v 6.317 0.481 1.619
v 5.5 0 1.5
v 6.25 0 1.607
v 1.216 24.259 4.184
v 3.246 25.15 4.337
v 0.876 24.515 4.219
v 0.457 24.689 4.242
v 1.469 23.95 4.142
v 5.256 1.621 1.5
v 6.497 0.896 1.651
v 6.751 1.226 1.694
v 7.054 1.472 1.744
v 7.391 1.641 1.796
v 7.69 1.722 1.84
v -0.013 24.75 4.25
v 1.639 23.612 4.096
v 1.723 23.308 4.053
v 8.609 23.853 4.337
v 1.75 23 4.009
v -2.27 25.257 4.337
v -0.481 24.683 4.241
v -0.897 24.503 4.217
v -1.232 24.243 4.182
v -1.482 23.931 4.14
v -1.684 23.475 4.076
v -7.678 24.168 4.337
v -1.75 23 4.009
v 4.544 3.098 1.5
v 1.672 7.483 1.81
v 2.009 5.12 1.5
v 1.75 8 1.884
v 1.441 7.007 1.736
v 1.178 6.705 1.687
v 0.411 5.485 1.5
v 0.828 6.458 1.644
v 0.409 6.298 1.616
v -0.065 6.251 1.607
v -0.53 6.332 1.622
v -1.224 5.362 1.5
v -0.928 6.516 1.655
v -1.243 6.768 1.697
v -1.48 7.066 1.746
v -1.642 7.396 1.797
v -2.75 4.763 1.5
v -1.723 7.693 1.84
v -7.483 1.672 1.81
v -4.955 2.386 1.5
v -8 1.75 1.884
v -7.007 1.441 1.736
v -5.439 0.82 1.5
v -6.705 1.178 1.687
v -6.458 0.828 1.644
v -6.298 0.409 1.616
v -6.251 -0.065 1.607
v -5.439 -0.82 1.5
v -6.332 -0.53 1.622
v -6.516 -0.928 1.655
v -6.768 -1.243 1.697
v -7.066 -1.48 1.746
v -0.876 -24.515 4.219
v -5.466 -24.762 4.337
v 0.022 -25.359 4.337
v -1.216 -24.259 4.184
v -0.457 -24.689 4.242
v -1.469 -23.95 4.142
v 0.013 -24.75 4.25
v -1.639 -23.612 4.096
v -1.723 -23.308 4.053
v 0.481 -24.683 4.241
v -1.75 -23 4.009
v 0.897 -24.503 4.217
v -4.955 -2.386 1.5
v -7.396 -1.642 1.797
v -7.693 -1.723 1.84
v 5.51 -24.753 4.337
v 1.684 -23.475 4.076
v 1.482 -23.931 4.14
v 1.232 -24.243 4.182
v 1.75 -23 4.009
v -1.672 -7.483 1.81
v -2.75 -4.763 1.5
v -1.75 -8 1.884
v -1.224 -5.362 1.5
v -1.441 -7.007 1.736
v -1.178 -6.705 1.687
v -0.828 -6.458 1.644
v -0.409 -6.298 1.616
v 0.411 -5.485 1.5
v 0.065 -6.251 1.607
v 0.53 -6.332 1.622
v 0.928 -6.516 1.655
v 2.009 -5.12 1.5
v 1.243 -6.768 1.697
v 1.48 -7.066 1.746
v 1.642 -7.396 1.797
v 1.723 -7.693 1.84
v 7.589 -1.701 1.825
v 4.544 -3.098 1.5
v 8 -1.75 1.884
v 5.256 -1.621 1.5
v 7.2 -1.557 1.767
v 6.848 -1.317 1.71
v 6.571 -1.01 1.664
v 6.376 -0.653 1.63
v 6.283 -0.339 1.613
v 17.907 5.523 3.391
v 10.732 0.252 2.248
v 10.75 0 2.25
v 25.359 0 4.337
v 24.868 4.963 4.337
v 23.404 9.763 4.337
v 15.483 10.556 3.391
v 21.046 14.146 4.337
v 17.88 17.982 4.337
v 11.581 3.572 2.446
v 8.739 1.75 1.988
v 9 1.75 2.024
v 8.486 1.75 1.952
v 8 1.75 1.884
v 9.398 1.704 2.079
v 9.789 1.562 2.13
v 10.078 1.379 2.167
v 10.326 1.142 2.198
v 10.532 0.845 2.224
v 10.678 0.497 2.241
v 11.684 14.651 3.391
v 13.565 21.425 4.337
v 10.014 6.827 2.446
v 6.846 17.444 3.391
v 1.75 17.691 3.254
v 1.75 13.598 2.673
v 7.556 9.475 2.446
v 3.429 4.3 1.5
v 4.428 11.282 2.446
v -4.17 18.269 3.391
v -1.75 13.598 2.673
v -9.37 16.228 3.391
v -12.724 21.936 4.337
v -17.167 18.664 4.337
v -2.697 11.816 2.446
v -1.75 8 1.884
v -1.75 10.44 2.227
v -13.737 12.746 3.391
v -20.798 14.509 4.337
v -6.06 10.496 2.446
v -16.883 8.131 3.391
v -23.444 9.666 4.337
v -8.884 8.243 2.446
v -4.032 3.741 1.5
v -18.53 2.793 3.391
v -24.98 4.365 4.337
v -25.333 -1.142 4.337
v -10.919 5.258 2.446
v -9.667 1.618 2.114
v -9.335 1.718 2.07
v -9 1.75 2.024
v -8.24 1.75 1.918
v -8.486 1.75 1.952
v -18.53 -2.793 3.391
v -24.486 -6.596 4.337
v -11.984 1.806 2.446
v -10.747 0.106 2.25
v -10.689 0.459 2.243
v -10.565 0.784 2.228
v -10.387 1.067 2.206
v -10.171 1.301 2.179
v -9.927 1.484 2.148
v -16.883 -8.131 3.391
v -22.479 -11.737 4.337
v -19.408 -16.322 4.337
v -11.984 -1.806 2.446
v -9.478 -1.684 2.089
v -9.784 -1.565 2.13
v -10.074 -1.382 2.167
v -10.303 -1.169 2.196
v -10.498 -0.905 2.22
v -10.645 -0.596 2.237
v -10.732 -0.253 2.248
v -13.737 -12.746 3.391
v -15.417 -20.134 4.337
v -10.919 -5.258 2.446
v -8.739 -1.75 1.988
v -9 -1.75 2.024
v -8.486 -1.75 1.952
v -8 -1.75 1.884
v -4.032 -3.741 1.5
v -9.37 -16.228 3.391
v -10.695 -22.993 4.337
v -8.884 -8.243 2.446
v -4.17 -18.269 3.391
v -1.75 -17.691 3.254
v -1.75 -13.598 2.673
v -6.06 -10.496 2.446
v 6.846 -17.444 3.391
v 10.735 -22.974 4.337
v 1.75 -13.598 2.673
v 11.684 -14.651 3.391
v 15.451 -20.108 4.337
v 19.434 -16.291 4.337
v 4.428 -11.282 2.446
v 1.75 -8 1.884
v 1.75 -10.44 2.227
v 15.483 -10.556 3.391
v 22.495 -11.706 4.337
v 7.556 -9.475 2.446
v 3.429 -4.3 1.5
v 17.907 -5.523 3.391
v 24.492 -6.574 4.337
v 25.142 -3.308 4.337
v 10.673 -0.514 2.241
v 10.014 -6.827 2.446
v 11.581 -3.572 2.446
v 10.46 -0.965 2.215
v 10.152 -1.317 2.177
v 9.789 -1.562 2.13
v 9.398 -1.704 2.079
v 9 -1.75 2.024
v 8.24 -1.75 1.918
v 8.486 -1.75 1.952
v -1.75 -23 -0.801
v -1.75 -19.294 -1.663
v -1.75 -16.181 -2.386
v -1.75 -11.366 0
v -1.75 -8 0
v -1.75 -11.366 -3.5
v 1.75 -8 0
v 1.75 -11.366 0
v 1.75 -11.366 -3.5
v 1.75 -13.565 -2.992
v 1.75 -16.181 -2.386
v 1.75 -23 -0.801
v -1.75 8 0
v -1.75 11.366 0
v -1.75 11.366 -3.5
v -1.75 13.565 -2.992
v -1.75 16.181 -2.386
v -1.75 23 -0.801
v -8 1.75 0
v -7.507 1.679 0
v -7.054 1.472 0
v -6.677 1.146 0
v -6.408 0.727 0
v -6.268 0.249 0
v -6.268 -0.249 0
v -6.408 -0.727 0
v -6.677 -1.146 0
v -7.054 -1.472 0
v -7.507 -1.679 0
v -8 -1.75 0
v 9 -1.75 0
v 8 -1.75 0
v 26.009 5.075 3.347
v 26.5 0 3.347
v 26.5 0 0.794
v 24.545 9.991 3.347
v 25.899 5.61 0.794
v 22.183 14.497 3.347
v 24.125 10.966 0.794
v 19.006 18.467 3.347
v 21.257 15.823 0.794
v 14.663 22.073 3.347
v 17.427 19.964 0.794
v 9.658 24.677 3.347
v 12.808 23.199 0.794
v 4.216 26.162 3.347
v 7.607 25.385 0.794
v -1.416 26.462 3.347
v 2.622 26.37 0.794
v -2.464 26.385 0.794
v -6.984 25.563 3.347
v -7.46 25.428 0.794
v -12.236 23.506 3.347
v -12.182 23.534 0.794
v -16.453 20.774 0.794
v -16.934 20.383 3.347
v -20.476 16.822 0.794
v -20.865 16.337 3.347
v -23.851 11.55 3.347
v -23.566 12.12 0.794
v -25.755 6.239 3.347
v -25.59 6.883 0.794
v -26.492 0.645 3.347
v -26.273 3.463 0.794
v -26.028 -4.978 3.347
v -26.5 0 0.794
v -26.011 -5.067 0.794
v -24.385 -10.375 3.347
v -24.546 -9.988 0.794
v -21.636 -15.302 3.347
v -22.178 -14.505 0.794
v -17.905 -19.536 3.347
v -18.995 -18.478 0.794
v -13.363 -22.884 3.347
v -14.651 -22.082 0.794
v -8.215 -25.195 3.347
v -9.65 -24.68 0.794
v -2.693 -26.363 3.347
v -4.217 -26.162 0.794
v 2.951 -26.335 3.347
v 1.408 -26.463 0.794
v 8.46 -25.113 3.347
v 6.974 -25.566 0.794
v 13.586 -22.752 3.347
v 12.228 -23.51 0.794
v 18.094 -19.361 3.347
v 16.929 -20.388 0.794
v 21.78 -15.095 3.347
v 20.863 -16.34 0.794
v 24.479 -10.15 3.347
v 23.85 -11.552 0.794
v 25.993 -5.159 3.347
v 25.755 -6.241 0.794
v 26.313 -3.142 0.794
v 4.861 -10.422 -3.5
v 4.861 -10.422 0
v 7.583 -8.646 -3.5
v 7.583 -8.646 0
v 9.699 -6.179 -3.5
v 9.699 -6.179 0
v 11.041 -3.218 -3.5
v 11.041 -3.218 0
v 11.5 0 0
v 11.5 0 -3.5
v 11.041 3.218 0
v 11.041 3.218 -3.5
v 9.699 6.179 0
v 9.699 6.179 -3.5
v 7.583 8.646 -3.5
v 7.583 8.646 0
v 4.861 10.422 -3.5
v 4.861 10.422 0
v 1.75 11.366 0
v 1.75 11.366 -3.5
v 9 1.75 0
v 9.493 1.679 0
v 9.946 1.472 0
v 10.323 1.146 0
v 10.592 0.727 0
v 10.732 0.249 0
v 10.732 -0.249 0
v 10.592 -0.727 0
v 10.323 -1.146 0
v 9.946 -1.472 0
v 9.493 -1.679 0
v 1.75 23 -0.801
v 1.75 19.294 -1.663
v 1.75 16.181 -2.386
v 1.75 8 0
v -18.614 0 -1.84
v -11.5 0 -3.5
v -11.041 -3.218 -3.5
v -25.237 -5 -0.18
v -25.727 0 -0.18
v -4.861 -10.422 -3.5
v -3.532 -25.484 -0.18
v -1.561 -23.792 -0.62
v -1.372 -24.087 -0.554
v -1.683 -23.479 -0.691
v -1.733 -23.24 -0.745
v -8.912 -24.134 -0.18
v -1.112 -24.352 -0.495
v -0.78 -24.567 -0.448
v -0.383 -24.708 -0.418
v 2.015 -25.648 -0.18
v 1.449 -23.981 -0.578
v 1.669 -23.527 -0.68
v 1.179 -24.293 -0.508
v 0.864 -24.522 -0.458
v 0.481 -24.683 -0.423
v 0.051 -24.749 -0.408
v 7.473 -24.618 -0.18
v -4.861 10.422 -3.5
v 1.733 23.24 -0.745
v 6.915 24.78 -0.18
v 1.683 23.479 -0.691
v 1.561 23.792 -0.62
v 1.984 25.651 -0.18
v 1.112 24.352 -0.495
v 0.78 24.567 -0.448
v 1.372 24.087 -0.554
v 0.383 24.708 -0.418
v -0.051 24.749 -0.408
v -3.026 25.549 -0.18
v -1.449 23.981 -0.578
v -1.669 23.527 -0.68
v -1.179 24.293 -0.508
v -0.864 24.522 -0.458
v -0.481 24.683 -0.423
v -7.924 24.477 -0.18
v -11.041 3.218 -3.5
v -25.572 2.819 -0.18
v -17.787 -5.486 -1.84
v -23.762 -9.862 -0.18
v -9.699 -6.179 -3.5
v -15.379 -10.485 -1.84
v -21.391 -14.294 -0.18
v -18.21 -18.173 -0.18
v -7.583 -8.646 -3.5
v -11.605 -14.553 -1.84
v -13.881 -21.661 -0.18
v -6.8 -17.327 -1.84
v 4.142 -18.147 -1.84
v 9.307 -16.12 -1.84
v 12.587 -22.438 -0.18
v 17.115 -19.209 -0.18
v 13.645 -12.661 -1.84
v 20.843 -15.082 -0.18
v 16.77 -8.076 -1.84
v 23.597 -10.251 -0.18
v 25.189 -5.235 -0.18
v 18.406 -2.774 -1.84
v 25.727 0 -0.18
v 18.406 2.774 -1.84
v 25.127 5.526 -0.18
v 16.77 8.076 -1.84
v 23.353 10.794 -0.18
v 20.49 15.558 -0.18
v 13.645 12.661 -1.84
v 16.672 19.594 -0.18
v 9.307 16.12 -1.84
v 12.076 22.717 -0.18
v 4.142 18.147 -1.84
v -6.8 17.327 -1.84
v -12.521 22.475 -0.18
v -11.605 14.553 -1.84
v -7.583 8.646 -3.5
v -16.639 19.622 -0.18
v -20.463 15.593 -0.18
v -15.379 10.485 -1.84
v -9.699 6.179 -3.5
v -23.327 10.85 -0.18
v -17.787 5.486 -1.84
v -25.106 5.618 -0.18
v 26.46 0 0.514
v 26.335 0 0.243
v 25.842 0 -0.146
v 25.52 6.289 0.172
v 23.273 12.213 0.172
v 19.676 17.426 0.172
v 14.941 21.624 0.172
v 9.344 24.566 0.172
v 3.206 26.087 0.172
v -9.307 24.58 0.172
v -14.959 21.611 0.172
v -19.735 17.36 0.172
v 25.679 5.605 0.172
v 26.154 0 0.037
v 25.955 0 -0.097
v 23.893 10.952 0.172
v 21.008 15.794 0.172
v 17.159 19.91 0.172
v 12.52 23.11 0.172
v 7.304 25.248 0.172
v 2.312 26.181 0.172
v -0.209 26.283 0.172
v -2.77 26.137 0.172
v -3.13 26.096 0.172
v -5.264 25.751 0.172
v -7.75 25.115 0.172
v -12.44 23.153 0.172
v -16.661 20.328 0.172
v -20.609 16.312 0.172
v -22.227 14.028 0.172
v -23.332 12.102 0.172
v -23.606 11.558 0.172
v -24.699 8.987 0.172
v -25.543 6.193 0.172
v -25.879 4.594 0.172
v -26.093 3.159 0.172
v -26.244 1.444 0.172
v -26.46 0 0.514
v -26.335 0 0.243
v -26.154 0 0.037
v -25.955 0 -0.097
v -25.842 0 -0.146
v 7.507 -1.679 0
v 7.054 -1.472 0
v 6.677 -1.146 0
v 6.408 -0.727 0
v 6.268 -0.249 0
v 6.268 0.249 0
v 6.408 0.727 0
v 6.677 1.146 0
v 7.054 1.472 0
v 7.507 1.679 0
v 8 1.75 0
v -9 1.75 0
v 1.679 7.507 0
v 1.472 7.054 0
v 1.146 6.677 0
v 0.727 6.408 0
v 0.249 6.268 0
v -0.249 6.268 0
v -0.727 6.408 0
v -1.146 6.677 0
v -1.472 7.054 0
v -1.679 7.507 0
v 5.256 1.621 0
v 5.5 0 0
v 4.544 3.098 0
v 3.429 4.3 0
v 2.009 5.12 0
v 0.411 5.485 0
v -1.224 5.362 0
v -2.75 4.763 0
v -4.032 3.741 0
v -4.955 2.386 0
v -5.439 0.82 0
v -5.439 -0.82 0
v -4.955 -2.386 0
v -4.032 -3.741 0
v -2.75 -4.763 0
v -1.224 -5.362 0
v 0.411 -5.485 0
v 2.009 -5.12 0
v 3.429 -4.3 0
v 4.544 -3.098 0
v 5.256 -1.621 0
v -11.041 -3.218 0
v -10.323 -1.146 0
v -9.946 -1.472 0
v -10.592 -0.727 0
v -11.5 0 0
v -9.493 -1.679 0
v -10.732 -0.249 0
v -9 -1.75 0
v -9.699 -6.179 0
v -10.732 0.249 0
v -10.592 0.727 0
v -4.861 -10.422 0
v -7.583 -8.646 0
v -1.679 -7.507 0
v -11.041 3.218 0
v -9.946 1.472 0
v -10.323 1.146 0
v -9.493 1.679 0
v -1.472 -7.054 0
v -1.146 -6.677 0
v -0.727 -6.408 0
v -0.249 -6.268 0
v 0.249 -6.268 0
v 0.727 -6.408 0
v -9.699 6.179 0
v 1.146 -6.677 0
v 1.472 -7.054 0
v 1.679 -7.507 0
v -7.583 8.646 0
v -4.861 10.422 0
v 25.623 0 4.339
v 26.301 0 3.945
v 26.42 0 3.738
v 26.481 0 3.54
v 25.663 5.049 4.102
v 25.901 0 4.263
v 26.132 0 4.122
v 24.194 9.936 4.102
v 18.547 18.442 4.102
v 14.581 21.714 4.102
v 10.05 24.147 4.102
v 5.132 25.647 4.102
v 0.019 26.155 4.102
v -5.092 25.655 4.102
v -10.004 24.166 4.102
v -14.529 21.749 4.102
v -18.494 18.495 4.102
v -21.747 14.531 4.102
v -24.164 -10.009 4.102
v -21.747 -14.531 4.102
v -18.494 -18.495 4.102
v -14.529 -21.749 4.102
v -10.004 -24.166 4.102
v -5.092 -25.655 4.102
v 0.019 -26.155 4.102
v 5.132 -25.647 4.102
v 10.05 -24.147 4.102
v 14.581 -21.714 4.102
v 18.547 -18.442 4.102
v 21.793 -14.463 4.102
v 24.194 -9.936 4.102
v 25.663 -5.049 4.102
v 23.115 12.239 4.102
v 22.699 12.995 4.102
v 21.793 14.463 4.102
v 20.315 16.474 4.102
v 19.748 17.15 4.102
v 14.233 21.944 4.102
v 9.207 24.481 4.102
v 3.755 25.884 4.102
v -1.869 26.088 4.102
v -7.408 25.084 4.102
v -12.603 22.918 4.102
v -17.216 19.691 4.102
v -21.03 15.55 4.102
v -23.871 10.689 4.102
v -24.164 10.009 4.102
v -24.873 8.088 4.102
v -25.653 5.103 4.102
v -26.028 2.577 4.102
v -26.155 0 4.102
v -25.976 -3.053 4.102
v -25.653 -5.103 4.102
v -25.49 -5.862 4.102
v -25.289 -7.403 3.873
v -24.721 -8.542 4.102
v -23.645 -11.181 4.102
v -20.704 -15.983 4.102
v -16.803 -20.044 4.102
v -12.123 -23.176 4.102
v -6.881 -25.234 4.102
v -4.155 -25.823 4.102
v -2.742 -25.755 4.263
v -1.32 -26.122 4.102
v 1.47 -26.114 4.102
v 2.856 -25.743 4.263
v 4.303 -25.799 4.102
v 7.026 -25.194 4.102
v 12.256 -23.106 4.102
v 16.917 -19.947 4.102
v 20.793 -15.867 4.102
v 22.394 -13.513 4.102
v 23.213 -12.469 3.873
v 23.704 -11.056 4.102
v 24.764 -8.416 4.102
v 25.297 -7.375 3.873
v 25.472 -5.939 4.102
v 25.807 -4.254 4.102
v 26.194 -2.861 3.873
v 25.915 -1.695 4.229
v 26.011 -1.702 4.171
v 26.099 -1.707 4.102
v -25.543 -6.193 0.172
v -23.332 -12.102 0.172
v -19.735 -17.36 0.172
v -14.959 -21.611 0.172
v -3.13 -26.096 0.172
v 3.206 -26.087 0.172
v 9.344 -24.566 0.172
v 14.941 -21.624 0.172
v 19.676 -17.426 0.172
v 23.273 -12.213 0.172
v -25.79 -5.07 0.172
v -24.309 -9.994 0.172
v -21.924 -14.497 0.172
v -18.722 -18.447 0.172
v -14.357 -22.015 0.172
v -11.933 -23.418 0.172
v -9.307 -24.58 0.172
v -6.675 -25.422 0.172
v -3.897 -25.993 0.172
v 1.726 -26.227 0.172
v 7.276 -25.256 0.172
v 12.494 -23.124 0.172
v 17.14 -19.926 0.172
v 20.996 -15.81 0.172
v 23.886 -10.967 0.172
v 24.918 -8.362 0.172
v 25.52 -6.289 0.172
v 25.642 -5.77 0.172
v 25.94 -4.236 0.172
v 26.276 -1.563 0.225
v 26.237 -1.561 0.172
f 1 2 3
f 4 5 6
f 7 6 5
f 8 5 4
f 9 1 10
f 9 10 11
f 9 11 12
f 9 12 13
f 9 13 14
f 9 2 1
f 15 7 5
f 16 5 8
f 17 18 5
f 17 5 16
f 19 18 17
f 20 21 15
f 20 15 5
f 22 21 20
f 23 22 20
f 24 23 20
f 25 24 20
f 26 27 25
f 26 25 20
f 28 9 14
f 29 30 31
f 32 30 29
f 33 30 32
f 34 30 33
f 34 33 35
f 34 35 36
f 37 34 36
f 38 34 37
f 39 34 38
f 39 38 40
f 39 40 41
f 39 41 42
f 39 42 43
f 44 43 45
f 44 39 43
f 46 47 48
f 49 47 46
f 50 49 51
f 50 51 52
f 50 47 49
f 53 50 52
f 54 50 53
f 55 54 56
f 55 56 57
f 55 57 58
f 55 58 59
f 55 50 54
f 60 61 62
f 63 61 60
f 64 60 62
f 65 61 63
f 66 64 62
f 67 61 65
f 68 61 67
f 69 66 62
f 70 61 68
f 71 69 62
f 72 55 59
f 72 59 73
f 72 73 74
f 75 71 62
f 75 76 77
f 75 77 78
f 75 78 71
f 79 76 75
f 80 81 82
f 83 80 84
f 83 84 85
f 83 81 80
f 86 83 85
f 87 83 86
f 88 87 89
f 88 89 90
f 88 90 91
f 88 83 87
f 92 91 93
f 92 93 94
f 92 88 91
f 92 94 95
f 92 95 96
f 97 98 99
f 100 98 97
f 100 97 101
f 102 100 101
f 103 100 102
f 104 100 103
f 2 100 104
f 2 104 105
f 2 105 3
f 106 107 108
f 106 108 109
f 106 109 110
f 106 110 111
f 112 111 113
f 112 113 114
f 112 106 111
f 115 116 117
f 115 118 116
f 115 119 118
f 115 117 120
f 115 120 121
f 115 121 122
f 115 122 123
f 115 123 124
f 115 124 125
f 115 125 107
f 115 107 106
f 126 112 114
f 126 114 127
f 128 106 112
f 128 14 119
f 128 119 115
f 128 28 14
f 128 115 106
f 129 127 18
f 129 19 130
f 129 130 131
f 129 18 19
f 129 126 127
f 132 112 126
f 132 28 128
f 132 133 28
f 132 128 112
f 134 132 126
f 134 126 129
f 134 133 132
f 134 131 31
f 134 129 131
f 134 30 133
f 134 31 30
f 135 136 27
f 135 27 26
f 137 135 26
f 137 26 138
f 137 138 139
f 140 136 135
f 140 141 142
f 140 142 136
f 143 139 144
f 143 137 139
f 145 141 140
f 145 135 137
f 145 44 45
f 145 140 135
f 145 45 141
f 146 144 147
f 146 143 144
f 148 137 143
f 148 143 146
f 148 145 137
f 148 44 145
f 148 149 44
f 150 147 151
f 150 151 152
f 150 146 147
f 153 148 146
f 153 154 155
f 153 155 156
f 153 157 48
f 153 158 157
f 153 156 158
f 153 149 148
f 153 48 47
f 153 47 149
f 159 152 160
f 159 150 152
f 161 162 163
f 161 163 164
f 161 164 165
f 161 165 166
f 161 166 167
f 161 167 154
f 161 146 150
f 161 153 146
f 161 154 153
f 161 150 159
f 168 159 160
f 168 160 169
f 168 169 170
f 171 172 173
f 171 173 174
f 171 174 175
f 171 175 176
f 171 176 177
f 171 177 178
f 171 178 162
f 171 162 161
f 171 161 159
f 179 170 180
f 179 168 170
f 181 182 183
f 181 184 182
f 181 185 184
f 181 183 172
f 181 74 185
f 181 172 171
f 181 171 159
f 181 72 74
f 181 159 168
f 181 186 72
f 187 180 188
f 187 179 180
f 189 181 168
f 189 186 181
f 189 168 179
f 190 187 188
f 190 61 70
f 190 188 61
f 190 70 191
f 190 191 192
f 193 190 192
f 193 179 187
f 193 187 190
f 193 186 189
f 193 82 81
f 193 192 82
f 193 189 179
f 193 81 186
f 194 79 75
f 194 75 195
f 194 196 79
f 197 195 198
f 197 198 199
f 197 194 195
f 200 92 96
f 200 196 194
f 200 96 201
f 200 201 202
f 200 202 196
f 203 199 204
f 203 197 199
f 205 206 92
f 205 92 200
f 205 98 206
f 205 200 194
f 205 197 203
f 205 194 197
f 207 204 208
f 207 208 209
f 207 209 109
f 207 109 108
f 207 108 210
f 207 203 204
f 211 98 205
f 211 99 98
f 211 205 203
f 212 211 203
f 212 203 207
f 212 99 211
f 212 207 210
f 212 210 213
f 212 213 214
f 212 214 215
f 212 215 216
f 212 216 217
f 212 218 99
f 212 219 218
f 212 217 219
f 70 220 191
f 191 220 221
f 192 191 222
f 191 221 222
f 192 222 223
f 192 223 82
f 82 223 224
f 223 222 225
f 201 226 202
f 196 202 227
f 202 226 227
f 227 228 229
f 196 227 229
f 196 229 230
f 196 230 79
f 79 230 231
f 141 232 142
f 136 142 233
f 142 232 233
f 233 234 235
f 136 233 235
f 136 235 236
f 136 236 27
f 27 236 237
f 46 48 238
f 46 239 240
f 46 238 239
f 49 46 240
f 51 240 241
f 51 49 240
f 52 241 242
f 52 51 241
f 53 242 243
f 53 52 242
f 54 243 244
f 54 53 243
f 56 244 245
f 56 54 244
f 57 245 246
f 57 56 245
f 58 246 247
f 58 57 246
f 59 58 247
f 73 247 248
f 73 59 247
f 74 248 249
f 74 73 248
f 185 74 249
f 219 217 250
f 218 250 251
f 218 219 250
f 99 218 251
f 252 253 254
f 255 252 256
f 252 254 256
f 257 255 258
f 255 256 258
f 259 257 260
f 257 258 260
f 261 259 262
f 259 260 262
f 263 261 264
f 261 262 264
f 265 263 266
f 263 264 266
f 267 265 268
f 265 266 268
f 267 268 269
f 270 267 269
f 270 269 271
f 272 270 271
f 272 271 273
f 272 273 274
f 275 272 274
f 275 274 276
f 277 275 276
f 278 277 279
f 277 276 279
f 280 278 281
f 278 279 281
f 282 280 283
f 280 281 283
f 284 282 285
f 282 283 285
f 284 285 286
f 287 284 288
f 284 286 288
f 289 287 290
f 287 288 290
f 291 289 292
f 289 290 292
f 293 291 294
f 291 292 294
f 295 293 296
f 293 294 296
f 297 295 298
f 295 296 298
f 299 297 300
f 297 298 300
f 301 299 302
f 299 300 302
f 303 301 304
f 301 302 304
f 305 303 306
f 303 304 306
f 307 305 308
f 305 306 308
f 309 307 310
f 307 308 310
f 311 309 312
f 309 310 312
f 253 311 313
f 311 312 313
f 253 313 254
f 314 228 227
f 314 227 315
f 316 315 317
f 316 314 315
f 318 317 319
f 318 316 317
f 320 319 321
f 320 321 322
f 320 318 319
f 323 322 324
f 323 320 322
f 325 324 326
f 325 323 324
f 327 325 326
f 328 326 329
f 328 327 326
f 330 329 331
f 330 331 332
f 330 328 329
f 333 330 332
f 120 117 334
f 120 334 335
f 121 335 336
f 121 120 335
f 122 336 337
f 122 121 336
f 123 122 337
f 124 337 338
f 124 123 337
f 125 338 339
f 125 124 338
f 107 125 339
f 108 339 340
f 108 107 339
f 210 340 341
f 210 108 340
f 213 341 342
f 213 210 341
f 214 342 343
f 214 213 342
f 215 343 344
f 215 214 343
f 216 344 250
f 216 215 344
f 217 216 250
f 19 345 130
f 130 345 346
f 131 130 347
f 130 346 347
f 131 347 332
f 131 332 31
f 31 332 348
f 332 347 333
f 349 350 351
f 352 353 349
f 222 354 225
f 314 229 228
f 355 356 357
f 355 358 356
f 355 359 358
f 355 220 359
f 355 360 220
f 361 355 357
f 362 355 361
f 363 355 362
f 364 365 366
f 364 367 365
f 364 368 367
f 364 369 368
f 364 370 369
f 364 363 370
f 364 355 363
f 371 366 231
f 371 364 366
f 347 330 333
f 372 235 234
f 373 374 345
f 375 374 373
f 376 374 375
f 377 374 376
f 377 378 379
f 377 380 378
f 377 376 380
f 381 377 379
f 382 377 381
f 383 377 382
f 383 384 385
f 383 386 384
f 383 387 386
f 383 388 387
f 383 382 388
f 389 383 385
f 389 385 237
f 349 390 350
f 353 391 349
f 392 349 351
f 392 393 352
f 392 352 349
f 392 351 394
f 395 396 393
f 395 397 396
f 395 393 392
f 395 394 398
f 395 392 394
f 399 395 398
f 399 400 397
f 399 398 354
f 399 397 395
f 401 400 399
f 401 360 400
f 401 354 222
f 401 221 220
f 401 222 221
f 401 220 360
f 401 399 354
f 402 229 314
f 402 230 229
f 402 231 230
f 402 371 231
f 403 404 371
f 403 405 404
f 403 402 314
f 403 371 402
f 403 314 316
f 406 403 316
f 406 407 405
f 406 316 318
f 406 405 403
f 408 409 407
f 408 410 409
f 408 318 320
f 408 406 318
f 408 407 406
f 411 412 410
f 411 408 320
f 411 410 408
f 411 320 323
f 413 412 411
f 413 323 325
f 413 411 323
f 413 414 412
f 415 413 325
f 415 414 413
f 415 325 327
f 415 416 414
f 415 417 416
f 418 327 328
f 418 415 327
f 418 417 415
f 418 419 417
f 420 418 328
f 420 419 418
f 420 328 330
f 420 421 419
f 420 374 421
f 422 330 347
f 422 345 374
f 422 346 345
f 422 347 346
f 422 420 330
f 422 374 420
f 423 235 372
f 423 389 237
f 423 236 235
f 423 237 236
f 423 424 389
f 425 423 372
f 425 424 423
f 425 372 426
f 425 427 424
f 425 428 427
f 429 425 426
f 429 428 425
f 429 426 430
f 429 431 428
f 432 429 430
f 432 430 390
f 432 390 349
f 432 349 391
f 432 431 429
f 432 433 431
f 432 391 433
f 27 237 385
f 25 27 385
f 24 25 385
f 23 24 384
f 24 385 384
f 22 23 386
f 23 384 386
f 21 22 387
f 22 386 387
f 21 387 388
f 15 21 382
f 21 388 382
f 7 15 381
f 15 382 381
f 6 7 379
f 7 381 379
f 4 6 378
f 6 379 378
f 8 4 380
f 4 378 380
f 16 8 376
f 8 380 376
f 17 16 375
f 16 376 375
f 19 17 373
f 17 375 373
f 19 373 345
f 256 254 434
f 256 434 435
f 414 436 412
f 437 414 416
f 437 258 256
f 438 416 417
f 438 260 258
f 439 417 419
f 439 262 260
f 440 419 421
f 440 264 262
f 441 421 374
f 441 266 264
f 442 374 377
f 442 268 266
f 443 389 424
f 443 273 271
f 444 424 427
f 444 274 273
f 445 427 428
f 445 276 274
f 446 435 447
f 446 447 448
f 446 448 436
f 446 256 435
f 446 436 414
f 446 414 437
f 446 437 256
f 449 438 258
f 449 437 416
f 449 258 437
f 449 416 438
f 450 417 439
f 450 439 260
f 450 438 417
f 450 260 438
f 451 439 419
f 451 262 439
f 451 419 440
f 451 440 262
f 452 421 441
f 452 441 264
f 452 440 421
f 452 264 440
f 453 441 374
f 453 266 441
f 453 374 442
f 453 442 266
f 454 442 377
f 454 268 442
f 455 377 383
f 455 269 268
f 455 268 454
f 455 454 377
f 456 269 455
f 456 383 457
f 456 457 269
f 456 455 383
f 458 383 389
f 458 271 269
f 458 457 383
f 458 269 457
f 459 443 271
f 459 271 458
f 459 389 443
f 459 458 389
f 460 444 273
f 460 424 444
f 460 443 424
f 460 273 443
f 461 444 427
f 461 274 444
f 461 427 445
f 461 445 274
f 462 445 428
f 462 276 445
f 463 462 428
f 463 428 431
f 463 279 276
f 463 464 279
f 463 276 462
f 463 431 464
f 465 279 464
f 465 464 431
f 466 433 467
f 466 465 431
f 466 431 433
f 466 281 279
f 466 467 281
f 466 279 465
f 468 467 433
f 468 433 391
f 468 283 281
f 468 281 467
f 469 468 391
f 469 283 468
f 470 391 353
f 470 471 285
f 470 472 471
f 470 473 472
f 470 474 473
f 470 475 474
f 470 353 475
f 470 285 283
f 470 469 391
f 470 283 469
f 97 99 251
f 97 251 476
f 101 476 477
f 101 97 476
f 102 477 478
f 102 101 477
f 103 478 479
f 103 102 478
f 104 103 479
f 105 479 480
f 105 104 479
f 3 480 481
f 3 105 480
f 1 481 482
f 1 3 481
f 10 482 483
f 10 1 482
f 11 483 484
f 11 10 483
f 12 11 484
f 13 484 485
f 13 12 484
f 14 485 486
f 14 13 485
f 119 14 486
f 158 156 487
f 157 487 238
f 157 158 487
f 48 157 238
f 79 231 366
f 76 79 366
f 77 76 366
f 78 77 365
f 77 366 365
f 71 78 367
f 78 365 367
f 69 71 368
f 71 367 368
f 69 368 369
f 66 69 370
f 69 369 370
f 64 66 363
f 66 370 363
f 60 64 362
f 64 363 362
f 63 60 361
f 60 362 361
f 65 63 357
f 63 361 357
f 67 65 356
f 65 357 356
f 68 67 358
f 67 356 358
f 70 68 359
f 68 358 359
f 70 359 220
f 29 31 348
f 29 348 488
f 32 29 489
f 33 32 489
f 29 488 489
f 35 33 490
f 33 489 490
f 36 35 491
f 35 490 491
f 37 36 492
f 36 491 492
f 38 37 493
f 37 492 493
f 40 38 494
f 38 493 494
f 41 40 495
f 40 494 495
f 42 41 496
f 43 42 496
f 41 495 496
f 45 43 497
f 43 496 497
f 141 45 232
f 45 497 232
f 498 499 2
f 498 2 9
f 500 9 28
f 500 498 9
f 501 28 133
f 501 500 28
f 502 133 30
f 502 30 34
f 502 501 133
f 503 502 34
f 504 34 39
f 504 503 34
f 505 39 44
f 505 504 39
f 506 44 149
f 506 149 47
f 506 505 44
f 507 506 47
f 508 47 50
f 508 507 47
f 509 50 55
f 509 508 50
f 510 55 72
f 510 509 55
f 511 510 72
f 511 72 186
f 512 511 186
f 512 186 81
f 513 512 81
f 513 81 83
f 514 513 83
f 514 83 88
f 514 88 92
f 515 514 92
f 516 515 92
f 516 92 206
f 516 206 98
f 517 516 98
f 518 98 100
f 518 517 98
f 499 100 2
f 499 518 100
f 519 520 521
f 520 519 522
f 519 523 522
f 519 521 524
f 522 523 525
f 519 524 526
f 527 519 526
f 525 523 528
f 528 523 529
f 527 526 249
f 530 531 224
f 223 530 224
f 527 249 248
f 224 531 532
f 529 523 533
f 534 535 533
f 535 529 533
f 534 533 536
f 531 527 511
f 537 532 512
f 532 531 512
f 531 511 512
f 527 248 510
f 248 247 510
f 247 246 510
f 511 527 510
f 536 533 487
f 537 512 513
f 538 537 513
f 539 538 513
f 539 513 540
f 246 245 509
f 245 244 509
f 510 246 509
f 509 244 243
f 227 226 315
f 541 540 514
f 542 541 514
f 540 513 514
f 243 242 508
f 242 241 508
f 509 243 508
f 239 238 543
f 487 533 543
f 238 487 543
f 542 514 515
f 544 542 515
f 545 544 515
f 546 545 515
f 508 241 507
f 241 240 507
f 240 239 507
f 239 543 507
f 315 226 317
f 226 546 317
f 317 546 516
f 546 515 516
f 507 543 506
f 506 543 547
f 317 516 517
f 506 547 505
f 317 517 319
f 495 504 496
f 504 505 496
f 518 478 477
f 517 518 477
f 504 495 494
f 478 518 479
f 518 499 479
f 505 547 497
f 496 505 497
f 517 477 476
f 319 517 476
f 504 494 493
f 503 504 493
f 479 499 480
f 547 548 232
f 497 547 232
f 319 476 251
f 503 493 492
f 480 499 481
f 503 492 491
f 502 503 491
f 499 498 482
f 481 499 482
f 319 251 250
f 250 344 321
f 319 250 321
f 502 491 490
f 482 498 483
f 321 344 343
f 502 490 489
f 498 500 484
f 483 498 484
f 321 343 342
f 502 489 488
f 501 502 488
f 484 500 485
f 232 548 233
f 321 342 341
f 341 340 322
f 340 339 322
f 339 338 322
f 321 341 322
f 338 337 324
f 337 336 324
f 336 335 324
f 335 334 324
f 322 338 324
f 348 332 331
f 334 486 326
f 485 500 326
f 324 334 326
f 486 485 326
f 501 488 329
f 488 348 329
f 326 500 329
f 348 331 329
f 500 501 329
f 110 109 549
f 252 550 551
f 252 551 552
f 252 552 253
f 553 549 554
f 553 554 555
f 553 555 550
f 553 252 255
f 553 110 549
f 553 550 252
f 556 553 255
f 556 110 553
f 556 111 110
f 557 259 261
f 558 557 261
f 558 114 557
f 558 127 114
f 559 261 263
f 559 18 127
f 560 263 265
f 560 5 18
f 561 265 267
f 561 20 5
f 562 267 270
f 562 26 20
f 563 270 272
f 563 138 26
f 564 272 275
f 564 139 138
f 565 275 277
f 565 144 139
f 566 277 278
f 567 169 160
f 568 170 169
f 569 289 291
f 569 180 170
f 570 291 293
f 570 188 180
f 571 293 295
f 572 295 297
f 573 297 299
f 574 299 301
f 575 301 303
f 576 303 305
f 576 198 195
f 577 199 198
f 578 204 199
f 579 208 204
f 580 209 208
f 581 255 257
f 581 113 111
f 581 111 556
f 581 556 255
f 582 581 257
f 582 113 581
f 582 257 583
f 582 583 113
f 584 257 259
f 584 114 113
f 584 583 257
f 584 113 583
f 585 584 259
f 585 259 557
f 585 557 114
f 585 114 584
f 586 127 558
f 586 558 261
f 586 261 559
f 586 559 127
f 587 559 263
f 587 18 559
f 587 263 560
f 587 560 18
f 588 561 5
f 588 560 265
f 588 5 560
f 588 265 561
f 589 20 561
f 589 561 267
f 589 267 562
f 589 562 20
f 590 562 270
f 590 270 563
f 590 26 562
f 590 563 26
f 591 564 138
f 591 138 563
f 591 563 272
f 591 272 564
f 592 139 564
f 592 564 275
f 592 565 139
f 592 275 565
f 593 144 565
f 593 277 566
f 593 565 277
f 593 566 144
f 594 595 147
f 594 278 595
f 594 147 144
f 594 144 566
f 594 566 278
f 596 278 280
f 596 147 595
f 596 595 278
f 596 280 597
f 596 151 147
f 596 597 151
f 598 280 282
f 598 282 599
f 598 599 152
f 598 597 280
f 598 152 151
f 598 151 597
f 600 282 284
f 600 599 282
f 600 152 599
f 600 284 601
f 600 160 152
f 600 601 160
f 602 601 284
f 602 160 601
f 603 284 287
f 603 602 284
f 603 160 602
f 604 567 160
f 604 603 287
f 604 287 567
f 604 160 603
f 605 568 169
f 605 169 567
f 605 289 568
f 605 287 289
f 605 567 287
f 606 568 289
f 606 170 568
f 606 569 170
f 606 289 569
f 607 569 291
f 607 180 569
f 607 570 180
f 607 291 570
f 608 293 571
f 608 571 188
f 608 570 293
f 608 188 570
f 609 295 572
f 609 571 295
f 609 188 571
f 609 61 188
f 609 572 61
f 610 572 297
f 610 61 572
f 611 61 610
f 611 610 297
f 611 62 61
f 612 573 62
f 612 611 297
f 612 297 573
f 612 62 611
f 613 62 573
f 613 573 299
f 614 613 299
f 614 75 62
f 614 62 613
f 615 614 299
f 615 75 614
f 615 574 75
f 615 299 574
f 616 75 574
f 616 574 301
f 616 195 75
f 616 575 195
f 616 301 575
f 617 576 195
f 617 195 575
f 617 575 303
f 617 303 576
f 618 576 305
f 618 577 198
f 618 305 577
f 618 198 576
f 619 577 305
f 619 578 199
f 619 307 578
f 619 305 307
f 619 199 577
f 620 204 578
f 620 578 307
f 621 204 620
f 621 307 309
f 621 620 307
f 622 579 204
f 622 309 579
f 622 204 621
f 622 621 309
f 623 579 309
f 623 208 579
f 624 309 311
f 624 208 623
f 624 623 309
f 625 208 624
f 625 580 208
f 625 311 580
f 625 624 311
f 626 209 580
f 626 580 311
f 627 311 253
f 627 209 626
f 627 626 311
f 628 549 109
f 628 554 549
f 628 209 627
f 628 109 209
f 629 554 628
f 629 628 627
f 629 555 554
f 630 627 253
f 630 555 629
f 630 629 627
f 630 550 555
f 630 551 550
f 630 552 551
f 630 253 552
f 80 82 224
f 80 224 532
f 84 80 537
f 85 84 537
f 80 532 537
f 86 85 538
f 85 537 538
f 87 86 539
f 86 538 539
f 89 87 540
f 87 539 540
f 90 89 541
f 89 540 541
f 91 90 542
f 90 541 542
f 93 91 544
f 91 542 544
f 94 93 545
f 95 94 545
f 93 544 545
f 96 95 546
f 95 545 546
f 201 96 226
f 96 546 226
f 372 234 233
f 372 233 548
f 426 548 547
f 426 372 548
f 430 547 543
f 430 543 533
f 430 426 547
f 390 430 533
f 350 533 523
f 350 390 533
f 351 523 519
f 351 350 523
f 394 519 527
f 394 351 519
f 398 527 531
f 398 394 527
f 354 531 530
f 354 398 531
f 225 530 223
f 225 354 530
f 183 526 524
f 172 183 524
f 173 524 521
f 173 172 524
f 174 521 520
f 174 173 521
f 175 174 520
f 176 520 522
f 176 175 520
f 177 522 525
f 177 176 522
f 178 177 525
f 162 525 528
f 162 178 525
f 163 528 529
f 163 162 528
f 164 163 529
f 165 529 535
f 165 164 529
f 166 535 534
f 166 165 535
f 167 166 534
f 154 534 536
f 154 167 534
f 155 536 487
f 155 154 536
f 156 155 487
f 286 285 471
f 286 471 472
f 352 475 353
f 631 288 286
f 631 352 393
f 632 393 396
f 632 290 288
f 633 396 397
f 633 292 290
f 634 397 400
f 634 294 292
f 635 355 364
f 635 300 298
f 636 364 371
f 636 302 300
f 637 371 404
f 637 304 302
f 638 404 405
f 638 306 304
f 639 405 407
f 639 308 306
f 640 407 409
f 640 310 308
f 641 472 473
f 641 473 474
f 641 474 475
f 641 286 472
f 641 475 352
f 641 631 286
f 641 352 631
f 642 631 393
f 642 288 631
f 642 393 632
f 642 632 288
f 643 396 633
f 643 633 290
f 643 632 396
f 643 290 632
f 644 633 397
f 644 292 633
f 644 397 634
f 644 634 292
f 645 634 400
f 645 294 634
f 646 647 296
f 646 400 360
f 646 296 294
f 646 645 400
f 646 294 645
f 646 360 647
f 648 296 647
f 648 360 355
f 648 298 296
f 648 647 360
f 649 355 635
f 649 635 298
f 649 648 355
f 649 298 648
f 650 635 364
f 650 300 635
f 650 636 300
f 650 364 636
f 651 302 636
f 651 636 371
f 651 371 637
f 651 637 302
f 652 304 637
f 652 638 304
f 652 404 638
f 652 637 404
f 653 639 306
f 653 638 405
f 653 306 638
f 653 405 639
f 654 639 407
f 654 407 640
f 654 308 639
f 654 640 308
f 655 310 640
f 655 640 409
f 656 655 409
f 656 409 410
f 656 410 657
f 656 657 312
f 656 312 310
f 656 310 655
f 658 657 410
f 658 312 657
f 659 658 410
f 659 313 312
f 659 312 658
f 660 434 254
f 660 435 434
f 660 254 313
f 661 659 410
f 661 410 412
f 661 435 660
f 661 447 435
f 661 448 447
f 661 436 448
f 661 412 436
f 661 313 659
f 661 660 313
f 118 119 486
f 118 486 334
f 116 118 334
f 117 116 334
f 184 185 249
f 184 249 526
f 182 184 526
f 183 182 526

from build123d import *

# Parameters (mm, degrees)
SKETCH1_R           = 26.5
SKETCH1_R_2         = 5.5
BOSS_EXTRUDE1_DEPTH = 1.5
HOLES_DEPTH         = 38.7458607
FILLET2_R           = 1
HOLES_PTR_COUNT     = 2


with BuildPart() as part:
    # Sketch1 → Boss-Extrude1 (new body)
    with BuildSketch(Plane.XY):
        Circle(SKETCH1_R)
        Circle(SKETCH1_R_2, mode=Mode.SUBTRACT)
    extrude(amount=BOSS_EXTRUDE1_DEPTH)

    # Sketch8 → Revolve2 (revolve)
    with BuildSketch(Plane(origin=(0, 0, 0), x_dir=(1, 0, 0), z_dir=(0, 1, 0))):
        Polygon((-11.5, 0), (-11.5, 3.5), (-26.5, 0), align=None)
        Polygon((5.5, -1.5), (26.5, -1.5), (26.5, -4.5), align=None)
    revolve(axis=Axis((0, 0, 0), (0, 0, 1)))

    # Sketch7 → holes (cut, symmetric)
    with BuildSketch(Plane.XY):
        with BuildLine():
            Line((1.75, -8), (1.75, -23))
            ThreePointArc((1.75, -23), (0, -24.75), (-1.75, -23))
            Line((-1.75, -23), (-1.75, -8))
            ThreePointArc((-1.75, -8), (0, -6.25), (1.75, -8))
        make_face()
        with BuildLine():
            Line((8, 1.75), (9, 1.75))
            ThreePointArc((9, 1.75), (10.75, 0), (9, -1.75))
            Line((9, -1.75), (8, -1.75))
            ThreePointArc((8, -1.75), (6.25, 0), (8, 1.75))
        make_face()
    holes = extrude(amount=HOLES_DEPTH, both=True, mode=Mode.SUBTRACT)

    # Fillet2
    fillet2_edges = [part.edges().sort_by_distance(p)[0] for p in [
        (0, 26.5, 0),
        (-26.5, 0, 4.5),
    ]]
    fillet(fillet2_edges, radius=FILLET2_R)

    # holes-ptr: holes ×2 about axis
    holes_ptr_axis = Axis((0, 0, 0), (0, 0, 1))
    for i in range(1, HOLES_PTR_COUNT):
        add(holes.rotate(holes_ptr_axis, i * 360 / HOLES_PTR_COUNT), mode=Mode.SUBTRACT)


solid = part.part
